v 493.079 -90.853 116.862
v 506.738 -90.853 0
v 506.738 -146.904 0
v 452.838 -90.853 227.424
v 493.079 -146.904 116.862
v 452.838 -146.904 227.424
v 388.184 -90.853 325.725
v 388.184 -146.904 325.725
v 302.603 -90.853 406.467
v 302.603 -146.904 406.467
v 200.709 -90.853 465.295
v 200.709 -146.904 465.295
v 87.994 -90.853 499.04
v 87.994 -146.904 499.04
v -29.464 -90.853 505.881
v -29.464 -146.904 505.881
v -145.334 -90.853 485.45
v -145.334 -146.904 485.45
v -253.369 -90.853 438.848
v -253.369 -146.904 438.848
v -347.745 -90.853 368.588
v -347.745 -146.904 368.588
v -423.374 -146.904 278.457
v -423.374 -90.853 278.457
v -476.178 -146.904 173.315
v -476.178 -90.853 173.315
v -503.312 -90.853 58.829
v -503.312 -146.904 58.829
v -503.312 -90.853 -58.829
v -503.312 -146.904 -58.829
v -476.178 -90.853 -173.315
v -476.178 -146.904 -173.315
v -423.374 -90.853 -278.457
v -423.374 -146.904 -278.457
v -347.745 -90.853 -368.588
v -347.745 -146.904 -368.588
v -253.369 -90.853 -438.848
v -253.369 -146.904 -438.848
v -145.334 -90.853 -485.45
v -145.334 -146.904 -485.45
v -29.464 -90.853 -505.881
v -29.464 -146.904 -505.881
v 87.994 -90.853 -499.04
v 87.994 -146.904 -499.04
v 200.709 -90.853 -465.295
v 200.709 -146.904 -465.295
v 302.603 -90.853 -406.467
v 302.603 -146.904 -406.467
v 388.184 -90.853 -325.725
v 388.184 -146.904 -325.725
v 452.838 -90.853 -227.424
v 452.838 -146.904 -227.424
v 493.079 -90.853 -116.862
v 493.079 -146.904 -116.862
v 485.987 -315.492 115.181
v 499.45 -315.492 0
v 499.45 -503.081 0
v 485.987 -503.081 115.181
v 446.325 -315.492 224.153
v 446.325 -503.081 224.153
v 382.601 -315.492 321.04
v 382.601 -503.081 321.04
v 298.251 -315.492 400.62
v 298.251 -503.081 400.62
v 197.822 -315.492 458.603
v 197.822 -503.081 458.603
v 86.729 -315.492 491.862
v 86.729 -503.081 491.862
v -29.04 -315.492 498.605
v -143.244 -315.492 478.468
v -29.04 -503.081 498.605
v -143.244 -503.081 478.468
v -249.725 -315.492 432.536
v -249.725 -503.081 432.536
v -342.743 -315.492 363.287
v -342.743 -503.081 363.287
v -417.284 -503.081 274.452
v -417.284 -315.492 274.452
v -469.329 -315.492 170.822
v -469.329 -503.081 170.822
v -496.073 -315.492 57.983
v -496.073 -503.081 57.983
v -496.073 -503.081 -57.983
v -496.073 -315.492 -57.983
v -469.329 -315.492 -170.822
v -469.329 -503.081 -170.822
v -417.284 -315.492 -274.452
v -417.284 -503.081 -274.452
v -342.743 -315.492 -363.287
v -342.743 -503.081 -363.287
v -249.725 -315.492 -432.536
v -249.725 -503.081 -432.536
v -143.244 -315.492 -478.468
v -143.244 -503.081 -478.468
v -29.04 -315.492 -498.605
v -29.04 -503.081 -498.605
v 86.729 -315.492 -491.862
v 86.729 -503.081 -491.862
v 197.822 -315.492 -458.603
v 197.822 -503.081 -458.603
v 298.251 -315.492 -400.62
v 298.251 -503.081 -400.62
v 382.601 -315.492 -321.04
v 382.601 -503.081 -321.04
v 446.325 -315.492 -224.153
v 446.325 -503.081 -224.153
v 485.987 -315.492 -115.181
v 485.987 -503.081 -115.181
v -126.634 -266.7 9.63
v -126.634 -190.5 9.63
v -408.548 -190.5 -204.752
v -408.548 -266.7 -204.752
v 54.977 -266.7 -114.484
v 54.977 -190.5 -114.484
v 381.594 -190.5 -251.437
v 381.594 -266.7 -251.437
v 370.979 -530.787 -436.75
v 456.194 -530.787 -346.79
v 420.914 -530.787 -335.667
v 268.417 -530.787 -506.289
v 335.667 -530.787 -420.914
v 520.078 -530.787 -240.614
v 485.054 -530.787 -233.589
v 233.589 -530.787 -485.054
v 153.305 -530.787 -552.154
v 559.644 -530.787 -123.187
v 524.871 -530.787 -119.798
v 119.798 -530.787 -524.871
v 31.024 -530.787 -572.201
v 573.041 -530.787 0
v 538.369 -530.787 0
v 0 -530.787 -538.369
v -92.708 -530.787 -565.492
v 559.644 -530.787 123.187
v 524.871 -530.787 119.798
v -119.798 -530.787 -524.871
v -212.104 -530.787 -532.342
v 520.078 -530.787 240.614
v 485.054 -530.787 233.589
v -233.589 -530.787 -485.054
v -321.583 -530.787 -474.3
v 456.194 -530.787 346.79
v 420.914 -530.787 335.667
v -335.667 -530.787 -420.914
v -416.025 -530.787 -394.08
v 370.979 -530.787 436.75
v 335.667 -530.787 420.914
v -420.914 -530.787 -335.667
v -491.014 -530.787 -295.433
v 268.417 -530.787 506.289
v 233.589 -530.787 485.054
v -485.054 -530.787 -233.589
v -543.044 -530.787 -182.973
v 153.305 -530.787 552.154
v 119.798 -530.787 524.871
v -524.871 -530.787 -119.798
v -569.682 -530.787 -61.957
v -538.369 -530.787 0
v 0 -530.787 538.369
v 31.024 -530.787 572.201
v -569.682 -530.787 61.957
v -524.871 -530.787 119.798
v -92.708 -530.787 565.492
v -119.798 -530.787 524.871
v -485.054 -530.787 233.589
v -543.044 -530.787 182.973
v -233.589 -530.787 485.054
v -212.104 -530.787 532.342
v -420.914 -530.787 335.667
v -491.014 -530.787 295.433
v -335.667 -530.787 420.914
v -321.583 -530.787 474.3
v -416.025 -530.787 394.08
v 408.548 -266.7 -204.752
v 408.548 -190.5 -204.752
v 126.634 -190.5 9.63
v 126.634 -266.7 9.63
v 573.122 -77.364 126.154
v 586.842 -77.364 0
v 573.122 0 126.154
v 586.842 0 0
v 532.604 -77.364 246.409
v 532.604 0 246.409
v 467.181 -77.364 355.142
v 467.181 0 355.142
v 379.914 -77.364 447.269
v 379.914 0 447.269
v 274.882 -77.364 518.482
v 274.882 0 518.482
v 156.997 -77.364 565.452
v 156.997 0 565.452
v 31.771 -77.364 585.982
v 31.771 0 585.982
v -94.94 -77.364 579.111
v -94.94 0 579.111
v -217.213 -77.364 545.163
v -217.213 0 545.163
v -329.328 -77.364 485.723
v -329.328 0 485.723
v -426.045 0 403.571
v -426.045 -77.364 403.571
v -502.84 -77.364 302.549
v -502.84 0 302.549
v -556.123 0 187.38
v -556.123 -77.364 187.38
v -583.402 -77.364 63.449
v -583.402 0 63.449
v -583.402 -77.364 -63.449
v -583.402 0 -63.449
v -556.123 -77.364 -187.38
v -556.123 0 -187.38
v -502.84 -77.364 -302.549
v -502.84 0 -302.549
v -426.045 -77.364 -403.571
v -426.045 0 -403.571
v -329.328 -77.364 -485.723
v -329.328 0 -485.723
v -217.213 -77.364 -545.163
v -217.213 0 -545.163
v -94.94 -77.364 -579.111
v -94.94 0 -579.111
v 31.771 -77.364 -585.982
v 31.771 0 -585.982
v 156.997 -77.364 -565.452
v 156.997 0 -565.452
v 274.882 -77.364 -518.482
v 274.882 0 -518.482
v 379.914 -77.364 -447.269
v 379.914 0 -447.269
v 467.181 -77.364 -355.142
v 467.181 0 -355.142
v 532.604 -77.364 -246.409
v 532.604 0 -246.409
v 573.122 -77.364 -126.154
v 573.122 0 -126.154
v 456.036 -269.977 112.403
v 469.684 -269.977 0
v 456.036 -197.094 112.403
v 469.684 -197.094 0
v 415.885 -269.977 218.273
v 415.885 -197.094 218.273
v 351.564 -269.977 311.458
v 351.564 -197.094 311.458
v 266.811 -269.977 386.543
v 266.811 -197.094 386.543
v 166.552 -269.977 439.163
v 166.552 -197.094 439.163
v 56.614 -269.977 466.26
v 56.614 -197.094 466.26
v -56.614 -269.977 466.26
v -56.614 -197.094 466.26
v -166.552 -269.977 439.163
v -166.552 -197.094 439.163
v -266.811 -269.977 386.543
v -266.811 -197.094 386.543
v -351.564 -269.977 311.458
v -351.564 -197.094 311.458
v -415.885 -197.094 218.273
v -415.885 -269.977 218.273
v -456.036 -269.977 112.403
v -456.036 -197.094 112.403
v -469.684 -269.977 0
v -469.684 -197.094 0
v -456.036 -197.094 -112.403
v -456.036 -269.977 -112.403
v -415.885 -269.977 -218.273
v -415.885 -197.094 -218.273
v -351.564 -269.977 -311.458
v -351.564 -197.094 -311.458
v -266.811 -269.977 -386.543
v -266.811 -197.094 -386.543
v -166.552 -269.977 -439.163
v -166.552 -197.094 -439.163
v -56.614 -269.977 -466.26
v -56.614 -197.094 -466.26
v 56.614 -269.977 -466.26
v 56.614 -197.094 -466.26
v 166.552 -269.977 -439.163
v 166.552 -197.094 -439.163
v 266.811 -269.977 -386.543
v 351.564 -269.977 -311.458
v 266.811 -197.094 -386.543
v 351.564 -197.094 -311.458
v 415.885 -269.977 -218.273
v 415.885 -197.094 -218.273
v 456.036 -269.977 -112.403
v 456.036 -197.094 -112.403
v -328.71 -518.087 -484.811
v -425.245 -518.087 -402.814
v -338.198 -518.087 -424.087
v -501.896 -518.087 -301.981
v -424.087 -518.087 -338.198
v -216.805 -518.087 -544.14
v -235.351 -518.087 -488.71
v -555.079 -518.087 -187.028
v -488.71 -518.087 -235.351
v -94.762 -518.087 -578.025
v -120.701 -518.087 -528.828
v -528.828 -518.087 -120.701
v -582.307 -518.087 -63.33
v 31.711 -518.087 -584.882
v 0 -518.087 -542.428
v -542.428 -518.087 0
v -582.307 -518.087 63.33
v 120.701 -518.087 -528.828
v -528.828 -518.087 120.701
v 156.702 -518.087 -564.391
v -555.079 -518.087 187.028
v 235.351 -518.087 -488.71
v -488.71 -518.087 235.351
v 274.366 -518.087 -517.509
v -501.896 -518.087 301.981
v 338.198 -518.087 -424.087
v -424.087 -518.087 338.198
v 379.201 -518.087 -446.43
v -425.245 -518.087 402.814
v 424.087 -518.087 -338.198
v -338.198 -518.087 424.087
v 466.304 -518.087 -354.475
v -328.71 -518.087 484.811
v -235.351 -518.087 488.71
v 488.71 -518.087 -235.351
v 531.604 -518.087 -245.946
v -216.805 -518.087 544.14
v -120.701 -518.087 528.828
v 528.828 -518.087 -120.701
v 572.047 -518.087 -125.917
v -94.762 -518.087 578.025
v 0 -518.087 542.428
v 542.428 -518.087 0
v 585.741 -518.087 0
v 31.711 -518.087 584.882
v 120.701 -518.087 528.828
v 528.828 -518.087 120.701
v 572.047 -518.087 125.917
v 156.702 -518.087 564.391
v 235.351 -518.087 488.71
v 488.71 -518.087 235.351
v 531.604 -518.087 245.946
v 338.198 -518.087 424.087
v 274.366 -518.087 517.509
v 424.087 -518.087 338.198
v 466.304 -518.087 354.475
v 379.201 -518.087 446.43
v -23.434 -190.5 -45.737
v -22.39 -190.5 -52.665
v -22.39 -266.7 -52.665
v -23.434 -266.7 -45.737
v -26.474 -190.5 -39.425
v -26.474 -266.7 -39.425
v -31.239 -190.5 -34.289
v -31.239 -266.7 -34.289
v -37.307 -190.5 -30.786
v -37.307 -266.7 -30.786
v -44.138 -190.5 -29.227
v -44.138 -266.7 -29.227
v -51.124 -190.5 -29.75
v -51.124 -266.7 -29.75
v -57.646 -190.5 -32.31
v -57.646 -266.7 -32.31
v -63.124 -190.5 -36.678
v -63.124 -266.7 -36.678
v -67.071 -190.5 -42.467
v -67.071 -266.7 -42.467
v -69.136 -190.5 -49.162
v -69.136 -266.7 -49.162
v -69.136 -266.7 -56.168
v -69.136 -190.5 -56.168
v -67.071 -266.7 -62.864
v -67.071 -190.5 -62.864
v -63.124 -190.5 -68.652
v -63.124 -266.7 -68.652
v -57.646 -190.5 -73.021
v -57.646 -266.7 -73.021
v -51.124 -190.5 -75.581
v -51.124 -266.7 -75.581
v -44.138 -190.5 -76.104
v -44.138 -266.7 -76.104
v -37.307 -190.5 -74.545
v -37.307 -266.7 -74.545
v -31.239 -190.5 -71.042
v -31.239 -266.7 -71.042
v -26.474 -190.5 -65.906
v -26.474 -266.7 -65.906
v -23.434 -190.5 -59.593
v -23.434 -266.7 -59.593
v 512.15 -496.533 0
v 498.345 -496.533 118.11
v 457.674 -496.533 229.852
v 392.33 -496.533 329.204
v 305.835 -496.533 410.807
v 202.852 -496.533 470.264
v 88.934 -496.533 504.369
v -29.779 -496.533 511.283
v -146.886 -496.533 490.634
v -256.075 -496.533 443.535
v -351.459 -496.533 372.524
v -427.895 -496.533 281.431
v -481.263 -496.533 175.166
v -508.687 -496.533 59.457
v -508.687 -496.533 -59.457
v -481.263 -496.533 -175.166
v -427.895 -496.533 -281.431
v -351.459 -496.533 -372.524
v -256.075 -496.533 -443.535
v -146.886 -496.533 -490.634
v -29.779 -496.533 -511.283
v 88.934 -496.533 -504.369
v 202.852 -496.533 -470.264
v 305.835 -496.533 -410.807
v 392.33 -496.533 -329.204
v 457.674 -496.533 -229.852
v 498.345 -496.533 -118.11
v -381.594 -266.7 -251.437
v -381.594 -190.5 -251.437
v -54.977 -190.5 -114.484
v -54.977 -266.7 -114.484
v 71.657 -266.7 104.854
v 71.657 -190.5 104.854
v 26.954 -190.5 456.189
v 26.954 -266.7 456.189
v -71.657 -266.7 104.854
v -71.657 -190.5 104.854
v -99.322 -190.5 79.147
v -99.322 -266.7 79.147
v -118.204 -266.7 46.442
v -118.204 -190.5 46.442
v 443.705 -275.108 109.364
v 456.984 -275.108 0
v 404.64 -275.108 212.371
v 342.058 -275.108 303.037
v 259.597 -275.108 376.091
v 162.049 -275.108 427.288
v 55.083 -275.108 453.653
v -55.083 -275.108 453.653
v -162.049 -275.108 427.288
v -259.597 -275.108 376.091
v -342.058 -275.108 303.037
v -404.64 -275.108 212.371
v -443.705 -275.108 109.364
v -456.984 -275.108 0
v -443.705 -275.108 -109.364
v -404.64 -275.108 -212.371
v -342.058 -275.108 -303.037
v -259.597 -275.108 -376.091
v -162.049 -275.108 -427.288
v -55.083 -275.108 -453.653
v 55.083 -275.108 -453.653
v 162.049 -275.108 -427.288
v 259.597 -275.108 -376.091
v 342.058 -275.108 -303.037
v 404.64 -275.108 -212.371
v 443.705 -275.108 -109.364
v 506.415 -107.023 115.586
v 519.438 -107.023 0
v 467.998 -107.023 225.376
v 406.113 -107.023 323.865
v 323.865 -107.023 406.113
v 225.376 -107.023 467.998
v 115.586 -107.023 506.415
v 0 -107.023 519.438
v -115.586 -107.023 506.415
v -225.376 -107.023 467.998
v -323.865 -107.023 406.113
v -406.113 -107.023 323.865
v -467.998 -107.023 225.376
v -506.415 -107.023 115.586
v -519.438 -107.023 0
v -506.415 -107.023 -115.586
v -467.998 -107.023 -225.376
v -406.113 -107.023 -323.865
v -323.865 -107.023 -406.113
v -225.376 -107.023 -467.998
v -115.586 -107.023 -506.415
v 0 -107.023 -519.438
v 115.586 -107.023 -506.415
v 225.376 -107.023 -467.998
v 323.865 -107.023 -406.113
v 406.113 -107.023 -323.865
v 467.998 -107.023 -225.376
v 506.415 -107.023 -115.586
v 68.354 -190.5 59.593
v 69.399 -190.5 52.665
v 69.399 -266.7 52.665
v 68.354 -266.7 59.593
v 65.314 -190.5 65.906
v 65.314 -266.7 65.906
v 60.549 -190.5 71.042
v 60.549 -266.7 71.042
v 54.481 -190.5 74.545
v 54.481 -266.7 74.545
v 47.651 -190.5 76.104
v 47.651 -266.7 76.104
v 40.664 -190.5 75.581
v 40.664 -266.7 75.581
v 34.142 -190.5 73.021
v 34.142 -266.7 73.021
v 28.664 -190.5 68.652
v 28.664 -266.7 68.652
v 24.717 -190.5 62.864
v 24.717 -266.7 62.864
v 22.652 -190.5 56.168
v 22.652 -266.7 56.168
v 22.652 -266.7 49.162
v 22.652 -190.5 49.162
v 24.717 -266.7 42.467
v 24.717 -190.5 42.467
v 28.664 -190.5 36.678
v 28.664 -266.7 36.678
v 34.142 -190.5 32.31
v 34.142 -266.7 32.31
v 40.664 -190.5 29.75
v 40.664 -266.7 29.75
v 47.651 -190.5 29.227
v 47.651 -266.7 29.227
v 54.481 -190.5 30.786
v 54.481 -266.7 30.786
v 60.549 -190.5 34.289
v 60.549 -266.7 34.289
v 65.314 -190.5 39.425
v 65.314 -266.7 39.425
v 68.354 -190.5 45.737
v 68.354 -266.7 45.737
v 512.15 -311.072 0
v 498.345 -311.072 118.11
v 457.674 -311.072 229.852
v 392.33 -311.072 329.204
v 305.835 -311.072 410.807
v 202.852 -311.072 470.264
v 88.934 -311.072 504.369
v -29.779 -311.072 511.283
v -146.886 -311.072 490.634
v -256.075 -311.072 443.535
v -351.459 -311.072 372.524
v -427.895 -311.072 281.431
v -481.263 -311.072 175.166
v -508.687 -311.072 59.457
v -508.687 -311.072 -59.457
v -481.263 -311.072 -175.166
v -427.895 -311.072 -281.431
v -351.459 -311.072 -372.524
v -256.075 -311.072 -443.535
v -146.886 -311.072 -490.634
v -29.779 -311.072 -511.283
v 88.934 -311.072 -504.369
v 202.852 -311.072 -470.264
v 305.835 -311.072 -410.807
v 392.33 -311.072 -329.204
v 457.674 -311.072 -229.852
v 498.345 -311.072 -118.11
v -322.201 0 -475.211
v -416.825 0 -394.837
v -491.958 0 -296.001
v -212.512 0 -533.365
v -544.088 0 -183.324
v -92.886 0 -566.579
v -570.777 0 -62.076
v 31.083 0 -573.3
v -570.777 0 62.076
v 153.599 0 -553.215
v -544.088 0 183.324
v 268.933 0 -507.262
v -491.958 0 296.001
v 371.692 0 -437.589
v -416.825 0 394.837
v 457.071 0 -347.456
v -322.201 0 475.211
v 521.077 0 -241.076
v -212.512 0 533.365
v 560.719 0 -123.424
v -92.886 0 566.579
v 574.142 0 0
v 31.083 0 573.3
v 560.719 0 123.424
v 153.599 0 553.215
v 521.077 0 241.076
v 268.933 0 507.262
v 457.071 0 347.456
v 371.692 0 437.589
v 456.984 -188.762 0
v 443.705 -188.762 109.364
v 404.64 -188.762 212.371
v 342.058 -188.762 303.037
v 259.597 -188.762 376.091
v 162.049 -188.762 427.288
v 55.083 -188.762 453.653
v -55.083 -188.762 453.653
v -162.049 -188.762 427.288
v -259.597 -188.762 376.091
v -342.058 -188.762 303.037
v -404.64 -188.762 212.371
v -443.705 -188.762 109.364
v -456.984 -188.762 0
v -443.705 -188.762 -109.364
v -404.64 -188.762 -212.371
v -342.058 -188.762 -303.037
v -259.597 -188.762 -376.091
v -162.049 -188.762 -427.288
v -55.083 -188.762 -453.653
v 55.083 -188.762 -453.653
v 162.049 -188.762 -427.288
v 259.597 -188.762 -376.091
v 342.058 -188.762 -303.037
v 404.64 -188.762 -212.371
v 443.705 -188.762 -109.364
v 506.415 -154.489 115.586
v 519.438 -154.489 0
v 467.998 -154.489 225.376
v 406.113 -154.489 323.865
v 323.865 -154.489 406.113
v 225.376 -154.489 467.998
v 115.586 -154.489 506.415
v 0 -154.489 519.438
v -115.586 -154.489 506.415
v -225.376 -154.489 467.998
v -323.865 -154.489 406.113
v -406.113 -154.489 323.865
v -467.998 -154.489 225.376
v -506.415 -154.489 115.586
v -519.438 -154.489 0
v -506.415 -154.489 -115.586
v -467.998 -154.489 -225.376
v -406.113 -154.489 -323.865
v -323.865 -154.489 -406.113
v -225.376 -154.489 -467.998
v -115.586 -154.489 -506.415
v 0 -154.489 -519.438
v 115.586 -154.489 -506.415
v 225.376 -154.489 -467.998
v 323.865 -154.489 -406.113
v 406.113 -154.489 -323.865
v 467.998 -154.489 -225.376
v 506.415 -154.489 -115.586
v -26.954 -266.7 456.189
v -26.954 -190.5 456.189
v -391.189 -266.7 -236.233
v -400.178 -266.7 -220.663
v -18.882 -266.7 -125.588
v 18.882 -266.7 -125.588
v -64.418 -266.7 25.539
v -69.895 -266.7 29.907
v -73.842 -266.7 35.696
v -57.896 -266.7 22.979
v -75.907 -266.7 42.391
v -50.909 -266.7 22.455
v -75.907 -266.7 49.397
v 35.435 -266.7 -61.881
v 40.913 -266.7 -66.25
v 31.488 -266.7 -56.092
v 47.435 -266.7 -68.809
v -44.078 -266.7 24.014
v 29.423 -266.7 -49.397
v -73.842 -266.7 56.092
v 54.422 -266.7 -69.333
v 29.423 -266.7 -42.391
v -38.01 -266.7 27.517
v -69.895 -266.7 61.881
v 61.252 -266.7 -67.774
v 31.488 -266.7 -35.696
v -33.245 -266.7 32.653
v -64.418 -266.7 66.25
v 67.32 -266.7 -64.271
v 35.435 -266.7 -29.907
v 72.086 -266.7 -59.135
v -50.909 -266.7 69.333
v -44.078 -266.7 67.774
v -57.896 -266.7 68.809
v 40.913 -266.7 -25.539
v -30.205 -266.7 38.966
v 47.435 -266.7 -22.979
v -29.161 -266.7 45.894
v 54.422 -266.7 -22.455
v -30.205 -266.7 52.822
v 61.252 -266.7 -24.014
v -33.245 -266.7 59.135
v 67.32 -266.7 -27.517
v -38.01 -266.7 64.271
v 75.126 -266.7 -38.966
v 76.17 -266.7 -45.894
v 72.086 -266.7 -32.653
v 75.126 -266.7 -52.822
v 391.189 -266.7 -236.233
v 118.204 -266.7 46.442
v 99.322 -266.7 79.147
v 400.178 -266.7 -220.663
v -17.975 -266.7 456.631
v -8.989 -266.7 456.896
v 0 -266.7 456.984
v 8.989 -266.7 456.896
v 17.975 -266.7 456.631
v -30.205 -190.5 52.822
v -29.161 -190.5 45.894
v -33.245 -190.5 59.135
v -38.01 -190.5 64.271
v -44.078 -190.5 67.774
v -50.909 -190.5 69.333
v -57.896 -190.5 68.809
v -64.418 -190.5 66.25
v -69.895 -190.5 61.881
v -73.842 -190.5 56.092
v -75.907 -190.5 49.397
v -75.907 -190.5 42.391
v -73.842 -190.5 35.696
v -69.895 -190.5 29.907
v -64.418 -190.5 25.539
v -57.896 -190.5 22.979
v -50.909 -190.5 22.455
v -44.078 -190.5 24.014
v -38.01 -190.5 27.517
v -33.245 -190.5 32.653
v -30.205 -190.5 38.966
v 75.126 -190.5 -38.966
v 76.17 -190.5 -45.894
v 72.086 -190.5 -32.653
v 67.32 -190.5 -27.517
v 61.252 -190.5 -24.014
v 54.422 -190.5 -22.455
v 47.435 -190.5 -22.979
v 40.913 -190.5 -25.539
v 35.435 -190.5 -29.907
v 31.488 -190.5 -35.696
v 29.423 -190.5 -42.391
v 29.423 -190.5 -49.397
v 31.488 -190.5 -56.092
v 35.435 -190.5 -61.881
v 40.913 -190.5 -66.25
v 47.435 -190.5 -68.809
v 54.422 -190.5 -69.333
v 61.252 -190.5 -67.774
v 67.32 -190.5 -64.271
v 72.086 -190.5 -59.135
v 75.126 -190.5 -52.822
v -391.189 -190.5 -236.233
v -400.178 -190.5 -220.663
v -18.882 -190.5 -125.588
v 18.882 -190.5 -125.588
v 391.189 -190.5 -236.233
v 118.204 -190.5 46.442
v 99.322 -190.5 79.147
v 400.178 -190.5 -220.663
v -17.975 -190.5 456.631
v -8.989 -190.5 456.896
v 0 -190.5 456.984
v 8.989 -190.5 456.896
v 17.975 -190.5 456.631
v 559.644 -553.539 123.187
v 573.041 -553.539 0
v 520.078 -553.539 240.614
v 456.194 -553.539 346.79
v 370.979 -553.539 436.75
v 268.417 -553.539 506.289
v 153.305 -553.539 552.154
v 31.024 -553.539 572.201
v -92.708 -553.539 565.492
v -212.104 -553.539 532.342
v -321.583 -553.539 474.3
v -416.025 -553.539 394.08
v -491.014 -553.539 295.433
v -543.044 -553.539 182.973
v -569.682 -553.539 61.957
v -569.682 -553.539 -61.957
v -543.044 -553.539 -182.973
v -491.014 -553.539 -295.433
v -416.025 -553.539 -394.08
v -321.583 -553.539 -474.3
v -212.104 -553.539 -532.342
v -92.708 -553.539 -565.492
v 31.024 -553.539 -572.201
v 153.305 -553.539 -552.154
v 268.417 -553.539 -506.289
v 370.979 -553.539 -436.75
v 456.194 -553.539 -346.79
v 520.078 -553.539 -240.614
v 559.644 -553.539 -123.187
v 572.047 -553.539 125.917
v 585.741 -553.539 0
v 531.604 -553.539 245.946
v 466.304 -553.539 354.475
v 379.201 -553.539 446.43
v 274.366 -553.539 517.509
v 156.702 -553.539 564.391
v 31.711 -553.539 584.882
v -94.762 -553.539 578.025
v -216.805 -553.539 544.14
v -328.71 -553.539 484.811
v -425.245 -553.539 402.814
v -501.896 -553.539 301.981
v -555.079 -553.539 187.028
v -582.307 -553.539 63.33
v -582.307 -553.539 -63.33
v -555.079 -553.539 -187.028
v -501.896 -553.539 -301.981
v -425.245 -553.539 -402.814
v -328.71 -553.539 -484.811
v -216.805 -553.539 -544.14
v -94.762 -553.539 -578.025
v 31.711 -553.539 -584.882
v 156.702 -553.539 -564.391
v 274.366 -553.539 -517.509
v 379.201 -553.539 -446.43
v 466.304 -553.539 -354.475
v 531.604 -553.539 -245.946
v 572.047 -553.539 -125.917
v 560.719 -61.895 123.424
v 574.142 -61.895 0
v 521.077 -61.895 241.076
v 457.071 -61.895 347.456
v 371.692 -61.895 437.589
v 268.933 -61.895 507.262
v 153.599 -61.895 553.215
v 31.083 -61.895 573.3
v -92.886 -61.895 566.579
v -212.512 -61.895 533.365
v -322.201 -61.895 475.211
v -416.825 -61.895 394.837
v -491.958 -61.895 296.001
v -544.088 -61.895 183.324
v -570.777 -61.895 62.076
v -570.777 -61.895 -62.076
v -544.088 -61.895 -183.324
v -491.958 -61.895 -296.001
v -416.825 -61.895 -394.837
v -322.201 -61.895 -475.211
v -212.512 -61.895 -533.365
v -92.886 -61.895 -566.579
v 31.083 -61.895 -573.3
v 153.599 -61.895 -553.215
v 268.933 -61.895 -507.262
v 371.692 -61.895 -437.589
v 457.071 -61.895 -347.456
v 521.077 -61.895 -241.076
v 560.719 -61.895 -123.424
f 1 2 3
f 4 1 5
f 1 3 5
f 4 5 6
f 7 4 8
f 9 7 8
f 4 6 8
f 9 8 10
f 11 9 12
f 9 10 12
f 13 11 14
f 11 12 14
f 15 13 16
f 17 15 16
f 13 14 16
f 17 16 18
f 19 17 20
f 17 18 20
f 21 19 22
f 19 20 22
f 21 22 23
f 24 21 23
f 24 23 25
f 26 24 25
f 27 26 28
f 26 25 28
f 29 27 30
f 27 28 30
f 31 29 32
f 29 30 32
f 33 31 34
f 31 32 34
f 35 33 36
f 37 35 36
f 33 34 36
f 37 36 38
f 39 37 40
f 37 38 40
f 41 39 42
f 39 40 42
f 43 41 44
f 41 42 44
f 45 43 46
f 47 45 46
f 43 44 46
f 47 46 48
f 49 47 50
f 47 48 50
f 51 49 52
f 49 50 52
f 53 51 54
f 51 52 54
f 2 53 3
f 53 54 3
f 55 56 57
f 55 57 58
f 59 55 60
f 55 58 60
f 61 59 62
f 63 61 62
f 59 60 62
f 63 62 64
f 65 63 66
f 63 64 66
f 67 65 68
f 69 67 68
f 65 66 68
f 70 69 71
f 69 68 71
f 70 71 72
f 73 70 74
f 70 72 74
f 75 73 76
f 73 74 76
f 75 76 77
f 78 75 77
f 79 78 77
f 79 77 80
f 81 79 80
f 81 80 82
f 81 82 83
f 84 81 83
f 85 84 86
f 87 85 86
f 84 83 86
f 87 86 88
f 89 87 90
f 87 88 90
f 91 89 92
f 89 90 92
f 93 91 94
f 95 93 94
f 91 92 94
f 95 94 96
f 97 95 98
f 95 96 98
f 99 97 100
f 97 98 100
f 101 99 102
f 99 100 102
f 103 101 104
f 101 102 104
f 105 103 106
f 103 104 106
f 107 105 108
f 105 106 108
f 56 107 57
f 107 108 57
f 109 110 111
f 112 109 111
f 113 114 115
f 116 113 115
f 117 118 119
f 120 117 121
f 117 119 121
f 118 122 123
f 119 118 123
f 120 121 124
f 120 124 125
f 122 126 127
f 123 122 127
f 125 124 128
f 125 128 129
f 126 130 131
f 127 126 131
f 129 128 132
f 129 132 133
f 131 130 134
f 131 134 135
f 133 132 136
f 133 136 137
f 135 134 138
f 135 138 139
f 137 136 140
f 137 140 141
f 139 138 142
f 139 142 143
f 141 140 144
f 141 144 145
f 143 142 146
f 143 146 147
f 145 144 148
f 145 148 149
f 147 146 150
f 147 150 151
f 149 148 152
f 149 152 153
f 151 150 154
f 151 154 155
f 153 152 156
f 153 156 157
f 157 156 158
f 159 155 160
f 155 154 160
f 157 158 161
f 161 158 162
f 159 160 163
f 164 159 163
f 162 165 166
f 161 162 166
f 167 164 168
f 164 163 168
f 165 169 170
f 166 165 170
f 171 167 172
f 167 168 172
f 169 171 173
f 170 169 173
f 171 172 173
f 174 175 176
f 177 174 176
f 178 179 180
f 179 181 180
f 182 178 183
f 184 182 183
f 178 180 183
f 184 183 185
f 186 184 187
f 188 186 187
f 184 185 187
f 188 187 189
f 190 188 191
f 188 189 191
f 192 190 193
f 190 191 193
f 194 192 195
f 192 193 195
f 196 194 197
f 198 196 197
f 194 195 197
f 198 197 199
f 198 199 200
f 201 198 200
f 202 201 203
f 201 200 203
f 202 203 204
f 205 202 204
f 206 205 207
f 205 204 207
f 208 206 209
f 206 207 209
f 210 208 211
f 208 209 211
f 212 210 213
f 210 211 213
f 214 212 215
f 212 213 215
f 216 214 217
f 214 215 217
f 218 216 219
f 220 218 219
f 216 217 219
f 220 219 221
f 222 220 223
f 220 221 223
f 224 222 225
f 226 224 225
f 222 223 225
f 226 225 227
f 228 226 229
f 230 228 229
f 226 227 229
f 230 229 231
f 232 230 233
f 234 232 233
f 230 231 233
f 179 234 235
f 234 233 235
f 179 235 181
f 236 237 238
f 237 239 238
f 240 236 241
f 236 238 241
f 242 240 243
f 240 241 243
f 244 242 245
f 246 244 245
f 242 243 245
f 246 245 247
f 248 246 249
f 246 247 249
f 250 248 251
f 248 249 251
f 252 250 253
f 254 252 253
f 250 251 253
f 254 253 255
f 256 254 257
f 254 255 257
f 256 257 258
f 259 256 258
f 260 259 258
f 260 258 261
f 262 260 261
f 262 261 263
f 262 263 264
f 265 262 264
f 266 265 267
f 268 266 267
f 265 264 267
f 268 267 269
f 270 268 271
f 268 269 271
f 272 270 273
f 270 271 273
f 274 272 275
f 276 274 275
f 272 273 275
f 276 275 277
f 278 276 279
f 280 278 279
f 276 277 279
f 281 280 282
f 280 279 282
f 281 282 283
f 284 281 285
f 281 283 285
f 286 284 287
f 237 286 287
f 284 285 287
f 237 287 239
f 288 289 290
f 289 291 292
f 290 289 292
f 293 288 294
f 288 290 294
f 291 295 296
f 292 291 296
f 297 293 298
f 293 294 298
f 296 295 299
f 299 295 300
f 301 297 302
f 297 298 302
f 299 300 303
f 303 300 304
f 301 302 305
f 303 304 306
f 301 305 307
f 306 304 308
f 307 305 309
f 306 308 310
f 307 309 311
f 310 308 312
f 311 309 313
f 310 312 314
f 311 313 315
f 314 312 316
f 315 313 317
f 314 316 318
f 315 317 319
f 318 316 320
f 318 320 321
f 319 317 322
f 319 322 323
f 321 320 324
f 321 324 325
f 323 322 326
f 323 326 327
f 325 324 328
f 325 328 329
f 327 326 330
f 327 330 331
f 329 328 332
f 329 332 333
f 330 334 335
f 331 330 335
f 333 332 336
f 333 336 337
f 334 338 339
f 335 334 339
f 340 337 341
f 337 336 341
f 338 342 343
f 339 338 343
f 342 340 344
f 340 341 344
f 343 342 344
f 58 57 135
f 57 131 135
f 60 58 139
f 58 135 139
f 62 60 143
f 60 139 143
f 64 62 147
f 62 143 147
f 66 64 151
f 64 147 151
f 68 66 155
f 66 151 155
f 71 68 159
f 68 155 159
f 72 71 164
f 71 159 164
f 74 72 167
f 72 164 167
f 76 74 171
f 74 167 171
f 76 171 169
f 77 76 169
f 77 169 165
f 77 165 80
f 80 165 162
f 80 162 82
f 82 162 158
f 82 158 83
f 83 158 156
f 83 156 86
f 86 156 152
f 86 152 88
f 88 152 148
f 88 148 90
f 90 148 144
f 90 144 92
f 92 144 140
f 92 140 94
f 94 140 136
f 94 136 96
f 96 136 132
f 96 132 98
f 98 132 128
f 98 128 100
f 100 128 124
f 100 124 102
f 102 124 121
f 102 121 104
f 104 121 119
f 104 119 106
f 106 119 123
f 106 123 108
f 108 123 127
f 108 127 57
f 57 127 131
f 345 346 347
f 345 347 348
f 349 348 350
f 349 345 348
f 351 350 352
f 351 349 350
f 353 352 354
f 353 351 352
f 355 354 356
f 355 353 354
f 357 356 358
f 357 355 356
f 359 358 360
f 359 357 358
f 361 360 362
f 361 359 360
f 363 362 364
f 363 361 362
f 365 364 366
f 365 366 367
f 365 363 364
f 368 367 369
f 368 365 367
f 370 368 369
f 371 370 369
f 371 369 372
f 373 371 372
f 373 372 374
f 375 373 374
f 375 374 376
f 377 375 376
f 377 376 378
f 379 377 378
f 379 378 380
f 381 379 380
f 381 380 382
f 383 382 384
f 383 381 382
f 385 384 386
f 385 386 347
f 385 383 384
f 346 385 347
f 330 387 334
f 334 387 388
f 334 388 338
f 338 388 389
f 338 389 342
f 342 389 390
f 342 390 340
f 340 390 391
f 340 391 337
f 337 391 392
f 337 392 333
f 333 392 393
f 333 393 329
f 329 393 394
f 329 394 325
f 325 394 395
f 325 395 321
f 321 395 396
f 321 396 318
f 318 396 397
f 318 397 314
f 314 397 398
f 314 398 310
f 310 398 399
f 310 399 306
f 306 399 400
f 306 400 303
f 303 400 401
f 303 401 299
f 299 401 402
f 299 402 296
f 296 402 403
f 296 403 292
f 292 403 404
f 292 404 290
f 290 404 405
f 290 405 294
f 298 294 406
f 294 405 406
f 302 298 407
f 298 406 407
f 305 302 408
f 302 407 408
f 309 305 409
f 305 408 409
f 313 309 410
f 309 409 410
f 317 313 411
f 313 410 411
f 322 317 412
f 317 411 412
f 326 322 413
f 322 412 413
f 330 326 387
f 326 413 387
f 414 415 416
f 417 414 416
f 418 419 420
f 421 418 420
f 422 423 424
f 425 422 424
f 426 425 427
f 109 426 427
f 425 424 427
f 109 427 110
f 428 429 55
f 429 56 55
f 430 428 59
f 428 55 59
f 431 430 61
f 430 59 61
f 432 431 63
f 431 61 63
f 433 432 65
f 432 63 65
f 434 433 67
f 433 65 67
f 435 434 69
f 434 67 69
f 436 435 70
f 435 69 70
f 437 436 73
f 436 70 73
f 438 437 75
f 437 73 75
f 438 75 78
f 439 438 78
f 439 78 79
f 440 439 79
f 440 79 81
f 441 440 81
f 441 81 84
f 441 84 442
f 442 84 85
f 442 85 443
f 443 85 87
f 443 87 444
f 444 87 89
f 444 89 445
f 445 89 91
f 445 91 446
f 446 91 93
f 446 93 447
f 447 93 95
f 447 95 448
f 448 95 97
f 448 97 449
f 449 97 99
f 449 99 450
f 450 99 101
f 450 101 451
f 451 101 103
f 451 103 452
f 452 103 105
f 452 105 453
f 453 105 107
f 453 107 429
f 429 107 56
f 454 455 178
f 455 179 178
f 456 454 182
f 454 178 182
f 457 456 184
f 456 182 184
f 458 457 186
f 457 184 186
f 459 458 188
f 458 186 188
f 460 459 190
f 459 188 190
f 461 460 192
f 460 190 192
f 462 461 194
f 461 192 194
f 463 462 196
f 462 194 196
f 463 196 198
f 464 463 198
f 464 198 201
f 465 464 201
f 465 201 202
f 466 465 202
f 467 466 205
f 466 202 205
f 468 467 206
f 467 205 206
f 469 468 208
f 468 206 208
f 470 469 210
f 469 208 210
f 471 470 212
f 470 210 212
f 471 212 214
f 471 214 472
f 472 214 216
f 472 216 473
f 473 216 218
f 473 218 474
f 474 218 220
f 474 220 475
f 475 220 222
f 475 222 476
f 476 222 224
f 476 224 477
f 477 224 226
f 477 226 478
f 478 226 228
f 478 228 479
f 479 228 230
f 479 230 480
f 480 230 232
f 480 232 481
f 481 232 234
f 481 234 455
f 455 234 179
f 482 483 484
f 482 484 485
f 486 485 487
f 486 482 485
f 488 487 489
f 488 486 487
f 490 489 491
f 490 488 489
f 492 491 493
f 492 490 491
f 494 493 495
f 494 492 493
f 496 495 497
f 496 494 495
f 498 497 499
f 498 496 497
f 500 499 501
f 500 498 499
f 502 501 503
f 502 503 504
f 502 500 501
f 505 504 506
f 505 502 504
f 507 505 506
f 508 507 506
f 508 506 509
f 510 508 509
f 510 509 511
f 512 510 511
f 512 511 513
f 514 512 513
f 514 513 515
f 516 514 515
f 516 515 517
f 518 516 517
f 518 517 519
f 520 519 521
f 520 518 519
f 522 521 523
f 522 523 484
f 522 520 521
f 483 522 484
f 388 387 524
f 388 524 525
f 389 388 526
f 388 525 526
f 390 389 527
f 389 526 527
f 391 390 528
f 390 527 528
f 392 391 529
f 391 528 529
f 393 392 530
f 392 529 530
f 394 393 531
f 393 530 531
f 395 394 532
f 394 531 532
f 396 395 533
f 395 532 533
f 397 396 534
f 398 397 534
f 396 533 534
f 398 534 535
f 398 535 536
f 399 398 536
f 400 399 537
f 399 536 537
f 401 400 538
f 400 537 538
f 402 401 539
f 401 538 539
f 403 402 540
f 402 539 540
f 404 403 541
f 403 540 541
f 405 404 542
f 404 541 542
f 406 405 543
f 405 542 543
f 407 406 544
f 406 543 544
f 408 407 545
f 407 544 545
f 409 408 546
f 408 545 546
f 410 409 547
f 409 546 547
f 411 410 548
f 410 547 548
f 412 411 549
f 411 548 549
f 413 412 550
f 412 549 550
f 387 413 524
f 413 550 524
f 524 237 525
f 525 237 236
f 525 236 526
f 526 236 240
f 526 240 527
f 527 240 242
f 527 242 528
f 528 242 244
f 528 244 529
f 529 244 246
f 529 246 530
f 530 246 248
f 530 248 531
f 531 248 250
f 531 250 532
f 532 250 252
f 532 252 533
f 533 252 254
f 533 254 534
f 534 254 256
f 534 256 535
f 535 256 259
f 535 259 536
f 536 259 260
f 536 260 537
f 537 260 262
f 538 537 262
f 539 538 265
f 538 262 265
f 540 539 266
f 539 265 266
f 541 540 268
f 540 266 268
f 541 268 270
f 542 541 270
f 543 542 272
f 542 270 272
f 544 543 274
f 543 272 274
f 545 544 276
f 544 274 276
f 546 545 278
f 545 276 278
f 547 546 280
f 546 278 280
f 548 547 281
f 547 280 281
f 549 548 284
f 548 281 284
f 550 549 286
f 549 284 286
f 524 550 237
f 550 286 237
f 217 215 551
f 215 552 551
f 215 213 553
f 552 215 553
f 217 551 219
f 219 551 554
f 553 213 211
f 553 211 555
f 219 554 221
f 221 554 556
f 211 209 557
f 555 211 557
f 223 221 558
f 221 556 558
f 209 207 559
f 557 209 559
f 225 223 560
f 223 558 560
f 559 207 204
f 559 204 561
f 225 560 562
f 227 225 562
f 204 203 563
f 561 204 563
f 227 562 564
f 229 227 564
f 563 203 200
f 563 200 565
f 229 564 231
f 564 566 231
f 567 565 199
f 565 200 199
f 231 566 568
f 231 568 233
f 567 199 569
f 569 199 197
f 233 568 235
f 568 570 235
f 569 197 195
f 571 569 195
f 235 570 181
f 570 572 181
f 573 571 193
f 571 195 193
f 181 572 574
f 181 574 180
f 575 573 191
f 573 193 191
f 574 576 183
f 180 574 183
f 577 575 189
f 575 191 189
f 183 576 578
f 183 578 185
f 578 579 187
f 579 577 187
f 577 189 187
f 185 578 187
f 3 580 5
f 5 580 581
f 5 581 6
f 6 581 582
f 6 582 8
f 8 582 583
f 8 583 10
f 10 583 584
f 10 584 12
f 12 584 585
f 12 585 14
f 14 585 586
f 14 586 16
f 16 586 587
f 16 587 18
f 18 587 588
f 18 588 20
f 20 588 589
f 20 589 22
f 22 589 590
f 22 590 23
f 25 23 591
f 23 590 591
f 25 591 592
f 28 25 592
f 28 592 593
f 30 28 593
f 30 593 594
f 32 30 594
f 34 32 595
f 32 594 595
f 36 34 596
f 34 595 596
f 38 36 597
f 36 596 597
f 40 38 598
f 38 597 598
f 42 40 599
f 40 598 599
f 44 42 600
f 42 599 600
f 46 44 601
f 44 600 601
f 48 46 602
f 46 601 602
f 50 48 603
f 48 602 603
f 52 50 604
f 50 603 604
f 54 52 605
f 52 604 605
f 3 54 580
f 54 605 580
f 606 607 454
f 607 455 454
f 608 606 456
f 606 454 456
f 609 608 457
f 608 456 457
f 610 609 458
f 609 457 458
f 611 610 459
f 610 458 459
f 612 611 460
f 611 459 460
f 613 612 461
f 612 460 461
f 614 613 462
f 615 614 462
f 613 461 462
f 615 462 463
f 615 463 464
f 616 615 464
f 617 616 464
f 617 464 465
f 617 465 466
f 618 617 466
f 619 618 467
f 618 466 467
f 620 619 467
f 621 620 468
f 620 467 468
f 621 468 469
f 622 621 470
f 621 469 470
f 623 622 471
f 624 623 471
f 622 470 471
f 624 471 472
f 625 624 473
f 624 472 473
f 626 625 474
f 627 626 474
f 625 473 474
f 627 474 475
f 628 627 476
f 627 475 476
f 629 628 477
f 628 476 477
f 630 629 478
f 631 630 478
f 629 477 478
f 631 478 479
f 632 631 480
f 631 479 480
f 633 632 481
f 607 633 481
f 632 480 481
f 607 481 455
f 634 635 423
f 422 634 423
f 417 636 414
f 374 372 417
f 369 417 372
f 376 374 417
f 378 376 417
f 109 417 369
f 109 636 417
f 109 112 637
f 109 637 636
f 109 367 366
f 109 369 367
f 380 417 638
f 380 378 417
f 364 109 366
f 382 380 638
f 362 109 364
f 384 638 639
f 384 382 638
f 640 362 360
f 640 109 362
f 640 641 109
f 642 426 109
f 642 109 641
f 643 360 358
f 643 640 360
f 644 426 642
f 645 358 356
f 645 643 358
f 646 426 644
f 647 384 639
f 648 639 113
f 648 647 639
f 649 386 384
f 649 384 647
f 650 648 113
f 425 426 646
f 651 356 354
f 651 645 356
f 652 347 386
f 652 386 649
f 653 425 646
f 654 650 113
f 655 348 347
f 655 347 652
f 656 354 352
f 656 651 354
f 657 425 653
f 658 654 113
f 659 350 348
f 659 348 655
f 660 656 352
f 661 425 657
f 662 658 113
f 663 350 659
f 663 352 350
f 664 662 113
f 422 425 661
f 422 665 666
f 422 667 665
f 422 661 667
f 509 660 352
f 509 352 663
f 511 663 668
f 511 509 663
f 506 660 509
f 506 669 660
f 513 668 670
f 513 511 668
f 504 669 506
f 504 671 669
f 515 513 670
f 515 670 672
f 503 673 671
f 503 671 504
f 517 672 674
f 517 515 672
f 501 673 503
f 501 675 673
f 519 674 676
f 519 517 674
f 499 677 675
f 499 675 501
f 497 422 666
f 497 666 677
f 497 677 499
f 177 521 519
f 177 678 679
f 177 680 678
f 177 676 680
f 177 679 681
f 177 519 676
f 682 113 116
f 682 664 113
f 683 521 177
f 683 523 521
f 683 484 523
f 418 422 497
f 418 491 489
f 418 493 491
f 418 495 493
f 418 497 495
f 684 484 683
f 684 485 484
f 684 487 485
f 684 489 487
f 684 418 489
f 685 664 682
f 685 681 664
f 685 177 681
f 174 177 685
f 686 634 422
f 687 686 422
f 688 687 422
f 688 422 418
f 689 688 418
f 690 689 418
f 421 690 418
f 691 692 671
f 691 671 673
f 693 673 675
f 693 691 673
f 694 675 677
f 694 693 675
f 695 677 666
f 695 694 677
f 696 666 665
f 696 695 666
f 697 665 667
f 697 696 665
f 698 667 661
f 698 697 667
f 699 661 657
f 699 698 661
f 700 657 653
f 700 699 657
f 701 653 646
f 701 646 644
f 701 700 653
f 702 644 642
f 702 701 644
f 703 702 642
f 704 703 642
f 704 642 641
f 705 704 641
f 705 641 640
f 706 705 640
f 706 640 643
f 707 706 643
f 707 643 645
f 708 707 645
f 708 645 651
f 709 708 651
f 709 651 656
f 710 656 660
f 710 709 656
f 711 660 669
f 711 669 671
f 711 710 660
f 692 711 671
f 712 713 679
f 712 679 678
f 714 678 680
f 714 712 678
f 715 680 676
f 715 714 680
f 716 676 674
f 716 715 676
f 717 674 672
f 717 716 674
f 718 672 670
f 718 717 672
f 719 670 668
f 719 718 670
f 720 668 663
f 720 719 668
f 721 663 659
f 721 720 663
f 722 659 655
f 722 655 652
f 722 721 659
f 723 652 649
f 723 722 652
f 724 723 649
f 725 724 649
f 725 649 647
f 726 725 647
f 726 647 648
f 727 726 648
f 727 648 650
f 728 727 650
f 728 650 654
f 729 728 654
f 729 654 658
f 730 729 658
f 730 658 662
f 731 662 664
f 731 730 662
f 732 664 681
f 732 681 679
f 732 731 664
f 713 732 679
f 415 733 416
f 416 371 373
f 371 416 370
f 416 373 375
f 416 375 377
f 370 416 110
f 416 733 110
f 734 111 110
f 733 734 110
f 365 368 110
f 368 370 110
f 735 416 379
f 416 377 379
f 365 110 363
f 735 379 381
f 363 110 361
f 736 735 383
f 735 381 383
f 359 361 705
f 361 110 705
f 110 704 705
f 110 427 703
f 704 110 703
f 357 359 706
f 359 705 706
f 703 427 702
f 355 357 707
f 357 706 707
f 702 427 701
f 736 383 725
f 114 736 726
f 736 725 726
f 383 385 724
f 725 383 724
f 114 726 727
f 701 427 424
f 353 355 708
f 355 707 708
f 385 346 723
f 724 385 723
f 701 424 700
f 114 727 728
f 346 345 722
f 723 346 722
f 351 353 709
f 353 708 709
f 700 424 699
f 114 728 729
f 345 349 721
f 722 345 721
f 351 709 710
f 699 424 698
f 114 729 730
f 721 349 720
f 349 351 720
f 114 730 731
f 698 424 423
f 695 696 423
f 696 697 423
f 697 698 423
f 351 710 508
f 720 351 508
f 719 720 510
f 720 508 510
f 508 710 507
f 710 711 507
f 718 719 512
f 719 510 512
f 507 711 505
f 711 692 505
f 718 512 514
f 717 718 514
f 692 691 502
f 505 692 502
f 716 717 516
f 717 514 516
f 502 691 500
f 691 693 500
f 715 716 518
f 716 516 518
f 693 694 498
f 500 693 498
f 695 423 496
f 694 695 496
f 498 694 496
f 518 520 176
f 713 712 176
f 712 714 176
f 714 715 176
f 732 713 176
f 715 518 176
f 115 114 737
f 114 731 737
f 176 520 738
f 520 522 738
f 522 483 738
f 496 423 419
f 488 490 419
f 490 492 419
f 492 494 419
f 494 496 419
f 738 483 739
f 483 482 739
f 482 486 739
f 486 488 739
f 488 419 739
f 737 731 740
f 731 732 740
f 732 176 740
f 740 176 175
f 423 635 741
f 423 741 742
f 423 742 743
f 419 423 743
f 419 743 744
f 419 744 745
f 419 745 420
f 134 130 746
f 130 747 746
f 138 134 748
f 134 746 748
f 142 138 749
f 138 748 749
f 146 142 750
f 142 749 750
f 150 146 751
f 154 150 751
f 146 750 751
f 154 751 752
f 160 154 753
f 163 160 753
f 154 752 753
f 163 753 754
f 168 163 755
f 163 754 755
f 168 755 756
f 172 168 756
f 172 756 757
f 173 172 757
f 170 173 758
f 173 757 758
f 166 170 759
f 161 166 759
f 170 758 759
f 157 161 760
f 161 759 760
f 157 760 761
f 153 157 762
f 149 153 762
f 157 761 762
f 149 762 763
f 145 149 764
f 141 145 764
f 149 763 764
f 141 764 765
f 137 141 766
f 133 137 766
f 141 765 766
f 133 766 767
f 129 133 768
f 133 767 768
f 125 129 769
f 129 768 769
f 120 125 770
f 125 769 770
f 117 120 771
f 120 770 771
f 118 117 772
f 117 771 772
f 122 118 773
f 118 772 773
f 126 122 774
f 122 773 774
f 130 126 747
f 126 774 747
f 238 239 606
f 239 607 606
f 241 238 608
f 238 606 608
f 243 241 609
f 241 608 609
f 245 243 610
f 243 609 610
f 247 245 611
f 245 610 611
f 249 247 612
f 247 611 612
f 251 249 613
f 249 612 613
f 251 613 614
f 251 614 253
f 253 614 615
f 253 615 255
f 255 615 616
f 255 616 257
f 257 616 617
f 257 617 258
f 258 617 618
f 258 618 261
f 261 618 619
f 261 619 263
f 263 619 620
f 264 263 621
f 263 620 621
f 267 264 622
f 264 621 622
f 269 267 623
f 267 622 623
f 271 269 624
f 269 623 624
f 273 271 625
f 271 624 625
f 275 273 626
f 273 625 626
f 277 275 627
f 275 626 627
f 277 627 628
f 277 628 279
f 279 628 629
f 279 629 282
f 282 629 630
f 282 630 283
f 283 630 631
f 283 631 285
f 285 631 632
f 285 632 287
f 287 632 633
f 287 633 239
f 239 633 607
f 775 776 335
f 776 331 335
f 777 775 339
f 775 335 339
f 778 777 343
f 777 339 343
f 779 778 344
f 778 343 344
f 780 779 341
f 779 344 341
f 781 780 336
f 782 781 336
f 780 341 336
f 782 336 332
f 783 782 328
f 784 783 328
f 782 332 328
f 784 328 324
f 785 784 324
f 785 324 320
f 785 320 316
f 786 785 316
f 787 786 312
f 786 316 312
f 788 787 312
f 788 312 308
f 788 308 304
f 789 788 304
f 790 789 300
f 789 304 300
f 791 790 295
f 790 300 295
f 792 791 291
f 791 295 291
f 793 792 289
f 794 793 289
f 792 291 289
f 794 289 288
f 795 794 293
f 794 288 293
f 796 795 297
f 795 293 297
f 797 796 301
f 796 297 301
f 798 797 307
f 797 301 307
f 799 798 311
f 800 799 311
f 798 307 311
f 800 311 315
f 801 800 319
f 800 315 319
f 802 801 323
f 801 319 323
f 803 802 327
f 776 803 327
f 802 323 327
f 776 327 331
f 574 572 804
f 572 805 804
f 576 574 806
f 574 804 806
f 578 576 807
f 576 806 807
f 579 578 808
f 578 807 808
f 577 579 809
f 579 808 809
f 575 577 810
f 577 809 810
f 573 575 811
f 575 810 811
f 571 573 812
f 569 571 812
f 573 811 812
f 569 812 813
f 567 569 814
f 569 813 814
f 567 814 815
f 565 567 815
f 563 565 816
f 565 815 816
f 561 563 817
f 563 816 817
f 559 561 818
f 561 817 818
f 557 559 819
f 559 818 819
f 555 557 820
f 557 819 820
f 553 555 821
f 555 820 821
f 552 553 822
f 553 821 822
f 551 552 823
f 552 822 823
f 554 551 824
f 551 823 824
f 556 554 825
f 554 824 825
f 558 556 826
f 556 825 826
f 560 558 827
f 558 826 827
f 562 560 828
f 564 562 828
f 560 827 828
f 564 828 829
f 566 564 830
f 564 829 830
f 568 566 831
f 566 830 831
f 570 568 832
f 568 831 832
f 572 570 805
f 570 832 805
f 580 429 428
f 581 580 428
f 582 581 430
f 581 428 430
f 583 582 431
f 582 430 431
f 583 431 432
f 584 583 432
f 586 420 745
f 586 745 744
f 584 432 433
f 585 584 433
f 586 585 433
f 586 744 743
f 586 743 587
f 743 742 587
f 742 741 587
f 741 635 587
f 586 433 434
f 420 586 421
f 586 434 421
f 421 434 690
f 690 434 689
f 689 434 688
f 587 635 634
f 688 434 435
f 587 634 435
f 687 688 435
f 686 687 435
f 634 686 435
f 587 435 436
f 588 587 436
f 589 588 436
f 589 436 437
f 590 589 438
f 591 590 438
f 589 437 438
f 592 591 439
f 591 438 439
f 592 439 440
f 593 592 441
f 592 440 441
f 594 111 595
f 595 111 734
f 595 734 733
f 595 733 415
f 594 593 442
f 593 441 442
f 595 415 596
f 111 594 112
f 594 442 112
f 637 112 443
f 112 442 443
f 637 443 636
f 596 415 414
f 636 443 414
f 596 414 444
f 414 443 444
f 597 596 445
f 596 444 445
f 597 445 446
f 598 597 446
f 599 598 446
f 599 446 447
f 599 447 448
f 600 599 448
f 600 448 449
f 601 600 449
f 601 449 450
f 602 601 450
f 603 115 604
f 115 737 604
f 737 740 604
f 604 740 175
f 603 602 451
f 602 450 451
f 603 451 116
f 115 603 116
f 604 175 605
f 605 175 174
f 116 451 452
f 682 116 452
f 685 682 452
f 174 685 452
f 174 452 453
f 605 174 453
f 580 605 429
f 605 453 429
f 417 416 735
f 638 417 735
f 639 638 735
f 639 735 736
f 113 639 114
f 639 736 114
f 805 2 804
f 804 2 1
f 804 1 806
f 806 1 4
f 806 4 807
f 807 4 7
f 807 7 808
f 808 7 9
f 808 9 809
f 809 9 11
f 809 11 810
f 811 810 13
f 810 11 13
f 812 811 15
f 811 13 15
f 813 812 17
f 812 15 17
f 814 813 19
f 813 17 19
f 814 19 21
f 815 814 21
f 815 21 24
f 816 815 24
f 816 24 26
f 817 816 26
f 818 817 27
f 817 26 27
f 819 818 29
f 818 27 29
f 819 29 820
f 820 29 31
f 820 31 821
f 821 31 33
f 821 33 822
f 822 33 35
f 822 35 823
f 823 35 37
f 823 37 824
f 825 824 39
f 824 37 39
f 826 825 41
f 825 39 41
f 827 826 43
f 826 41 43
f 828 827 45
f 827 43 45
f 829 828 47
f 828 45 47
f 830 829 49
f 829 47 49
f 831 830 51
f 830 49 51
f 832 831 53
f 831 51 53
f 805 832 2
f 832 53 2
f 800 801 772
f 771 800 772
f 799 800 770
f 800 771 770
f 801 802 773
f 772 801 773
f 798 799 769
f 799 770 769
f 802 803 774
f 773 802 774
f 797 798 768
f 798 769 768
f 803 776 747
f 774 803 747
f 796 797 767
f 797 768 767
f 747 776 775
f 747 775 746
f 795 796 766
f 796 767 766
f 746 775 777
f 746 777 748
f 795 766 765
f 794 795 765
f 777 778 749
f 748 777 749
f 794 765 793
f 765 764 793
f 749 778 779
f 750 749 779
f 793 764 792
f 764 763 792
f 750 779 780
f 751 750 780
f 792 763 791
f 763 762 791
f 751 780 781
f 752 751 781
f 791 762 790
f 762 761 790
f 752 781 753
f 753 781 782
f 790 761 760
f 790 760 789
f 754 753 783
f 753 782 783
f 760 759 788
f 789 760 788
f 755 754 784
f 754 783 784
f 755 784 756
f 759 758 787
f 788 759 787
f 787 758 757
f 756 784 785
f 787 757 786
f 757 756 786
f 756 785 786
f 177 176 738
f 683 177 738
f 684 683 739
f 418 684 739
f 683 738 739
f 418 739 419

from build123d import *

# Parameters (mm, degrees)
F3_R     = 23.5045362994
F4_DEPTH = 76.2


with BuildPart() as f1:
    # F0 (on Top) → F1 (revolve)
    with BuildSketch(Plane.XY):
        Polygon((573.0409642621, -553.5393390198), (585.7409642621, -553.5393390198), (585.7409642621, -518.0866146582), (542.4275865968, -518.0866146582), (512.1499083626, -496.5325579214), (512.1499083626, -311.0723252855), (469.6844318455, -269.9765585894), (469.6844318455, -197.0943934766), (519.4383481781, -154.4892936945), (519.4383481781, -107.0225714794), (586.8421554444, -77.3644662998), (586.8421554444, 0), (574.1421554444, 0), (574.1421554444, -61.8945817717), (506.7383481781, -90.8532650404), (506.7383481781, -146.9035498934), (456.9844318455, -188.7616498797), (456.9844318455, -275.1079445892), (499.4499083626, -315.4920612499), (499.4499083626, -503.081022234), (538.3688470547, -530.7866146582), (573.0409642621, -530.7866146582), align=None)
    revolve(axis=Axis((0, -57.5910839191, 0), (0, -1, 0)))

    # F3 (on offset) → F4 (join)
    with BuildSketch(Plane.XZ.offset(190.5)):
        with BuildLine():
            Line((-381.5941034135, -251.4372907688), (-54.9773815999, -114.4835687443))
            ThreePointArc((-54.9773815999, -114.4835687443), (-109.9852262806, -63.5), (-126.6343696484, 9.6299752731))
            Line((-126.6343696484, 9.6299752731), (-408.5481329713, -204.7515421061))
            ThreePointArc((-408.5481329713, -204.7515421061), (-395.7601271122, -228.4922159227), (-381.5941034135, -251.4372907688))
        make_face()
        with BuildLine():
            ThreePointArc((-71.6569880485, 104.8535934712), (-37.5006241892, 121.3371467664), (0, 127))
            Line((0, 127), (0, 456.9844318455))
            ThreePointArc((0, 456.9844318455), (-13.4828844014, 456.785488799), (-26.9540295578, 456.1888328749))
            Line((-26.9540295578, 456.1888328749), (-71.6569880485, 104.8535934712))
        make_face()
        with BuildLine():
            ThreePointArc((0, 127), (37.5006241892, 121.3371467664), (71.6569880485, 104.8535934712))
            Line((71.6569880485, 104.8535934712), (26.9540295578, 456.1888328749))
            ThreePointArc((26.9540295578, 456.1888328749), (13.4828844014, 456.785488799), (0, 456.9844318455))
            Line((0, 456.9844318455), (0, 127))
        make_face()
        with BuildLine():
            ThreePointArc((126.6343696484, 9.6299752731), (126.9085594933, 4.8184569448), (127, 0))
            ThreePointArc((127, 0), (107.4968080065, -67.6271858679), (54.9773815999, -114.4835687443))
            Line((54.9773815999, -114.4835687443), (381.5941034135, -251.4372907688))
            ThreePointArc((381.5941034135, -251.4372907688), (395.7601271122, -228.4922159227), (408.5481329713, -204.7515421061))
            Line((408.5481329713, -204.7515421061), (126.6343696484, 9.6299752731))
        make_face()
        with BuildLine():
            ThreePointArc((54.9773815999, -114.4835687443), (107.4968080065, -67.6271858679), (127, 0))
            ThreePointArc((127, 0), (126.9085594933, 4.8184569448), (126.6343696484, 9.6299752731))
            ThreePointArc((126.6343696484, 9.6299752731), (109.9852262806, 63.5), (71.6569880485, 104.8535934712))
            ThreePointArc((71.6569880485, 104.8535934712), (37.5006241892, 121.3371467664), (0, 127))
            ThreePointArc((0, 127), (-37.5006241892, 121.3371467664), (-71.6569880485, 104.8535934712))
            ThreePointArc((-71.6569880485, 104.8535934712), (-109.9852262806, 63.5), (-126.6343696484, 9.6299752731))
            ThreePointArc((-126.6343696484, 9.6299752731), (-109.9852262806, -63.5), (-54.9773815999, -114.4835687443))
            ThreePointArc((-54.9773815999, -114.4835687443), (0, -127), (54.9773815999, -114.4835687443))
        make_face()
        with Locations((-45.8940714598, -52.665323019)):
            Circle(F3_R, mode=Mode.SUBTRACT)
        with Locations((52.665323019, -45.8940714598)):
            Circle(F3_R, mode=Mode.SUBTRACT)
        with Locations((-52.665323019, 45.8940714598)):
            Circle(F3_R, mode=Mode.SUBTRACT)
        with Locations((45.8940714598, 52.665323019)):
            Circle(F3_R, mode=Mode.SUBTRACT)
    extrude(amount=F4_DEPTH)


solid = f1.part
